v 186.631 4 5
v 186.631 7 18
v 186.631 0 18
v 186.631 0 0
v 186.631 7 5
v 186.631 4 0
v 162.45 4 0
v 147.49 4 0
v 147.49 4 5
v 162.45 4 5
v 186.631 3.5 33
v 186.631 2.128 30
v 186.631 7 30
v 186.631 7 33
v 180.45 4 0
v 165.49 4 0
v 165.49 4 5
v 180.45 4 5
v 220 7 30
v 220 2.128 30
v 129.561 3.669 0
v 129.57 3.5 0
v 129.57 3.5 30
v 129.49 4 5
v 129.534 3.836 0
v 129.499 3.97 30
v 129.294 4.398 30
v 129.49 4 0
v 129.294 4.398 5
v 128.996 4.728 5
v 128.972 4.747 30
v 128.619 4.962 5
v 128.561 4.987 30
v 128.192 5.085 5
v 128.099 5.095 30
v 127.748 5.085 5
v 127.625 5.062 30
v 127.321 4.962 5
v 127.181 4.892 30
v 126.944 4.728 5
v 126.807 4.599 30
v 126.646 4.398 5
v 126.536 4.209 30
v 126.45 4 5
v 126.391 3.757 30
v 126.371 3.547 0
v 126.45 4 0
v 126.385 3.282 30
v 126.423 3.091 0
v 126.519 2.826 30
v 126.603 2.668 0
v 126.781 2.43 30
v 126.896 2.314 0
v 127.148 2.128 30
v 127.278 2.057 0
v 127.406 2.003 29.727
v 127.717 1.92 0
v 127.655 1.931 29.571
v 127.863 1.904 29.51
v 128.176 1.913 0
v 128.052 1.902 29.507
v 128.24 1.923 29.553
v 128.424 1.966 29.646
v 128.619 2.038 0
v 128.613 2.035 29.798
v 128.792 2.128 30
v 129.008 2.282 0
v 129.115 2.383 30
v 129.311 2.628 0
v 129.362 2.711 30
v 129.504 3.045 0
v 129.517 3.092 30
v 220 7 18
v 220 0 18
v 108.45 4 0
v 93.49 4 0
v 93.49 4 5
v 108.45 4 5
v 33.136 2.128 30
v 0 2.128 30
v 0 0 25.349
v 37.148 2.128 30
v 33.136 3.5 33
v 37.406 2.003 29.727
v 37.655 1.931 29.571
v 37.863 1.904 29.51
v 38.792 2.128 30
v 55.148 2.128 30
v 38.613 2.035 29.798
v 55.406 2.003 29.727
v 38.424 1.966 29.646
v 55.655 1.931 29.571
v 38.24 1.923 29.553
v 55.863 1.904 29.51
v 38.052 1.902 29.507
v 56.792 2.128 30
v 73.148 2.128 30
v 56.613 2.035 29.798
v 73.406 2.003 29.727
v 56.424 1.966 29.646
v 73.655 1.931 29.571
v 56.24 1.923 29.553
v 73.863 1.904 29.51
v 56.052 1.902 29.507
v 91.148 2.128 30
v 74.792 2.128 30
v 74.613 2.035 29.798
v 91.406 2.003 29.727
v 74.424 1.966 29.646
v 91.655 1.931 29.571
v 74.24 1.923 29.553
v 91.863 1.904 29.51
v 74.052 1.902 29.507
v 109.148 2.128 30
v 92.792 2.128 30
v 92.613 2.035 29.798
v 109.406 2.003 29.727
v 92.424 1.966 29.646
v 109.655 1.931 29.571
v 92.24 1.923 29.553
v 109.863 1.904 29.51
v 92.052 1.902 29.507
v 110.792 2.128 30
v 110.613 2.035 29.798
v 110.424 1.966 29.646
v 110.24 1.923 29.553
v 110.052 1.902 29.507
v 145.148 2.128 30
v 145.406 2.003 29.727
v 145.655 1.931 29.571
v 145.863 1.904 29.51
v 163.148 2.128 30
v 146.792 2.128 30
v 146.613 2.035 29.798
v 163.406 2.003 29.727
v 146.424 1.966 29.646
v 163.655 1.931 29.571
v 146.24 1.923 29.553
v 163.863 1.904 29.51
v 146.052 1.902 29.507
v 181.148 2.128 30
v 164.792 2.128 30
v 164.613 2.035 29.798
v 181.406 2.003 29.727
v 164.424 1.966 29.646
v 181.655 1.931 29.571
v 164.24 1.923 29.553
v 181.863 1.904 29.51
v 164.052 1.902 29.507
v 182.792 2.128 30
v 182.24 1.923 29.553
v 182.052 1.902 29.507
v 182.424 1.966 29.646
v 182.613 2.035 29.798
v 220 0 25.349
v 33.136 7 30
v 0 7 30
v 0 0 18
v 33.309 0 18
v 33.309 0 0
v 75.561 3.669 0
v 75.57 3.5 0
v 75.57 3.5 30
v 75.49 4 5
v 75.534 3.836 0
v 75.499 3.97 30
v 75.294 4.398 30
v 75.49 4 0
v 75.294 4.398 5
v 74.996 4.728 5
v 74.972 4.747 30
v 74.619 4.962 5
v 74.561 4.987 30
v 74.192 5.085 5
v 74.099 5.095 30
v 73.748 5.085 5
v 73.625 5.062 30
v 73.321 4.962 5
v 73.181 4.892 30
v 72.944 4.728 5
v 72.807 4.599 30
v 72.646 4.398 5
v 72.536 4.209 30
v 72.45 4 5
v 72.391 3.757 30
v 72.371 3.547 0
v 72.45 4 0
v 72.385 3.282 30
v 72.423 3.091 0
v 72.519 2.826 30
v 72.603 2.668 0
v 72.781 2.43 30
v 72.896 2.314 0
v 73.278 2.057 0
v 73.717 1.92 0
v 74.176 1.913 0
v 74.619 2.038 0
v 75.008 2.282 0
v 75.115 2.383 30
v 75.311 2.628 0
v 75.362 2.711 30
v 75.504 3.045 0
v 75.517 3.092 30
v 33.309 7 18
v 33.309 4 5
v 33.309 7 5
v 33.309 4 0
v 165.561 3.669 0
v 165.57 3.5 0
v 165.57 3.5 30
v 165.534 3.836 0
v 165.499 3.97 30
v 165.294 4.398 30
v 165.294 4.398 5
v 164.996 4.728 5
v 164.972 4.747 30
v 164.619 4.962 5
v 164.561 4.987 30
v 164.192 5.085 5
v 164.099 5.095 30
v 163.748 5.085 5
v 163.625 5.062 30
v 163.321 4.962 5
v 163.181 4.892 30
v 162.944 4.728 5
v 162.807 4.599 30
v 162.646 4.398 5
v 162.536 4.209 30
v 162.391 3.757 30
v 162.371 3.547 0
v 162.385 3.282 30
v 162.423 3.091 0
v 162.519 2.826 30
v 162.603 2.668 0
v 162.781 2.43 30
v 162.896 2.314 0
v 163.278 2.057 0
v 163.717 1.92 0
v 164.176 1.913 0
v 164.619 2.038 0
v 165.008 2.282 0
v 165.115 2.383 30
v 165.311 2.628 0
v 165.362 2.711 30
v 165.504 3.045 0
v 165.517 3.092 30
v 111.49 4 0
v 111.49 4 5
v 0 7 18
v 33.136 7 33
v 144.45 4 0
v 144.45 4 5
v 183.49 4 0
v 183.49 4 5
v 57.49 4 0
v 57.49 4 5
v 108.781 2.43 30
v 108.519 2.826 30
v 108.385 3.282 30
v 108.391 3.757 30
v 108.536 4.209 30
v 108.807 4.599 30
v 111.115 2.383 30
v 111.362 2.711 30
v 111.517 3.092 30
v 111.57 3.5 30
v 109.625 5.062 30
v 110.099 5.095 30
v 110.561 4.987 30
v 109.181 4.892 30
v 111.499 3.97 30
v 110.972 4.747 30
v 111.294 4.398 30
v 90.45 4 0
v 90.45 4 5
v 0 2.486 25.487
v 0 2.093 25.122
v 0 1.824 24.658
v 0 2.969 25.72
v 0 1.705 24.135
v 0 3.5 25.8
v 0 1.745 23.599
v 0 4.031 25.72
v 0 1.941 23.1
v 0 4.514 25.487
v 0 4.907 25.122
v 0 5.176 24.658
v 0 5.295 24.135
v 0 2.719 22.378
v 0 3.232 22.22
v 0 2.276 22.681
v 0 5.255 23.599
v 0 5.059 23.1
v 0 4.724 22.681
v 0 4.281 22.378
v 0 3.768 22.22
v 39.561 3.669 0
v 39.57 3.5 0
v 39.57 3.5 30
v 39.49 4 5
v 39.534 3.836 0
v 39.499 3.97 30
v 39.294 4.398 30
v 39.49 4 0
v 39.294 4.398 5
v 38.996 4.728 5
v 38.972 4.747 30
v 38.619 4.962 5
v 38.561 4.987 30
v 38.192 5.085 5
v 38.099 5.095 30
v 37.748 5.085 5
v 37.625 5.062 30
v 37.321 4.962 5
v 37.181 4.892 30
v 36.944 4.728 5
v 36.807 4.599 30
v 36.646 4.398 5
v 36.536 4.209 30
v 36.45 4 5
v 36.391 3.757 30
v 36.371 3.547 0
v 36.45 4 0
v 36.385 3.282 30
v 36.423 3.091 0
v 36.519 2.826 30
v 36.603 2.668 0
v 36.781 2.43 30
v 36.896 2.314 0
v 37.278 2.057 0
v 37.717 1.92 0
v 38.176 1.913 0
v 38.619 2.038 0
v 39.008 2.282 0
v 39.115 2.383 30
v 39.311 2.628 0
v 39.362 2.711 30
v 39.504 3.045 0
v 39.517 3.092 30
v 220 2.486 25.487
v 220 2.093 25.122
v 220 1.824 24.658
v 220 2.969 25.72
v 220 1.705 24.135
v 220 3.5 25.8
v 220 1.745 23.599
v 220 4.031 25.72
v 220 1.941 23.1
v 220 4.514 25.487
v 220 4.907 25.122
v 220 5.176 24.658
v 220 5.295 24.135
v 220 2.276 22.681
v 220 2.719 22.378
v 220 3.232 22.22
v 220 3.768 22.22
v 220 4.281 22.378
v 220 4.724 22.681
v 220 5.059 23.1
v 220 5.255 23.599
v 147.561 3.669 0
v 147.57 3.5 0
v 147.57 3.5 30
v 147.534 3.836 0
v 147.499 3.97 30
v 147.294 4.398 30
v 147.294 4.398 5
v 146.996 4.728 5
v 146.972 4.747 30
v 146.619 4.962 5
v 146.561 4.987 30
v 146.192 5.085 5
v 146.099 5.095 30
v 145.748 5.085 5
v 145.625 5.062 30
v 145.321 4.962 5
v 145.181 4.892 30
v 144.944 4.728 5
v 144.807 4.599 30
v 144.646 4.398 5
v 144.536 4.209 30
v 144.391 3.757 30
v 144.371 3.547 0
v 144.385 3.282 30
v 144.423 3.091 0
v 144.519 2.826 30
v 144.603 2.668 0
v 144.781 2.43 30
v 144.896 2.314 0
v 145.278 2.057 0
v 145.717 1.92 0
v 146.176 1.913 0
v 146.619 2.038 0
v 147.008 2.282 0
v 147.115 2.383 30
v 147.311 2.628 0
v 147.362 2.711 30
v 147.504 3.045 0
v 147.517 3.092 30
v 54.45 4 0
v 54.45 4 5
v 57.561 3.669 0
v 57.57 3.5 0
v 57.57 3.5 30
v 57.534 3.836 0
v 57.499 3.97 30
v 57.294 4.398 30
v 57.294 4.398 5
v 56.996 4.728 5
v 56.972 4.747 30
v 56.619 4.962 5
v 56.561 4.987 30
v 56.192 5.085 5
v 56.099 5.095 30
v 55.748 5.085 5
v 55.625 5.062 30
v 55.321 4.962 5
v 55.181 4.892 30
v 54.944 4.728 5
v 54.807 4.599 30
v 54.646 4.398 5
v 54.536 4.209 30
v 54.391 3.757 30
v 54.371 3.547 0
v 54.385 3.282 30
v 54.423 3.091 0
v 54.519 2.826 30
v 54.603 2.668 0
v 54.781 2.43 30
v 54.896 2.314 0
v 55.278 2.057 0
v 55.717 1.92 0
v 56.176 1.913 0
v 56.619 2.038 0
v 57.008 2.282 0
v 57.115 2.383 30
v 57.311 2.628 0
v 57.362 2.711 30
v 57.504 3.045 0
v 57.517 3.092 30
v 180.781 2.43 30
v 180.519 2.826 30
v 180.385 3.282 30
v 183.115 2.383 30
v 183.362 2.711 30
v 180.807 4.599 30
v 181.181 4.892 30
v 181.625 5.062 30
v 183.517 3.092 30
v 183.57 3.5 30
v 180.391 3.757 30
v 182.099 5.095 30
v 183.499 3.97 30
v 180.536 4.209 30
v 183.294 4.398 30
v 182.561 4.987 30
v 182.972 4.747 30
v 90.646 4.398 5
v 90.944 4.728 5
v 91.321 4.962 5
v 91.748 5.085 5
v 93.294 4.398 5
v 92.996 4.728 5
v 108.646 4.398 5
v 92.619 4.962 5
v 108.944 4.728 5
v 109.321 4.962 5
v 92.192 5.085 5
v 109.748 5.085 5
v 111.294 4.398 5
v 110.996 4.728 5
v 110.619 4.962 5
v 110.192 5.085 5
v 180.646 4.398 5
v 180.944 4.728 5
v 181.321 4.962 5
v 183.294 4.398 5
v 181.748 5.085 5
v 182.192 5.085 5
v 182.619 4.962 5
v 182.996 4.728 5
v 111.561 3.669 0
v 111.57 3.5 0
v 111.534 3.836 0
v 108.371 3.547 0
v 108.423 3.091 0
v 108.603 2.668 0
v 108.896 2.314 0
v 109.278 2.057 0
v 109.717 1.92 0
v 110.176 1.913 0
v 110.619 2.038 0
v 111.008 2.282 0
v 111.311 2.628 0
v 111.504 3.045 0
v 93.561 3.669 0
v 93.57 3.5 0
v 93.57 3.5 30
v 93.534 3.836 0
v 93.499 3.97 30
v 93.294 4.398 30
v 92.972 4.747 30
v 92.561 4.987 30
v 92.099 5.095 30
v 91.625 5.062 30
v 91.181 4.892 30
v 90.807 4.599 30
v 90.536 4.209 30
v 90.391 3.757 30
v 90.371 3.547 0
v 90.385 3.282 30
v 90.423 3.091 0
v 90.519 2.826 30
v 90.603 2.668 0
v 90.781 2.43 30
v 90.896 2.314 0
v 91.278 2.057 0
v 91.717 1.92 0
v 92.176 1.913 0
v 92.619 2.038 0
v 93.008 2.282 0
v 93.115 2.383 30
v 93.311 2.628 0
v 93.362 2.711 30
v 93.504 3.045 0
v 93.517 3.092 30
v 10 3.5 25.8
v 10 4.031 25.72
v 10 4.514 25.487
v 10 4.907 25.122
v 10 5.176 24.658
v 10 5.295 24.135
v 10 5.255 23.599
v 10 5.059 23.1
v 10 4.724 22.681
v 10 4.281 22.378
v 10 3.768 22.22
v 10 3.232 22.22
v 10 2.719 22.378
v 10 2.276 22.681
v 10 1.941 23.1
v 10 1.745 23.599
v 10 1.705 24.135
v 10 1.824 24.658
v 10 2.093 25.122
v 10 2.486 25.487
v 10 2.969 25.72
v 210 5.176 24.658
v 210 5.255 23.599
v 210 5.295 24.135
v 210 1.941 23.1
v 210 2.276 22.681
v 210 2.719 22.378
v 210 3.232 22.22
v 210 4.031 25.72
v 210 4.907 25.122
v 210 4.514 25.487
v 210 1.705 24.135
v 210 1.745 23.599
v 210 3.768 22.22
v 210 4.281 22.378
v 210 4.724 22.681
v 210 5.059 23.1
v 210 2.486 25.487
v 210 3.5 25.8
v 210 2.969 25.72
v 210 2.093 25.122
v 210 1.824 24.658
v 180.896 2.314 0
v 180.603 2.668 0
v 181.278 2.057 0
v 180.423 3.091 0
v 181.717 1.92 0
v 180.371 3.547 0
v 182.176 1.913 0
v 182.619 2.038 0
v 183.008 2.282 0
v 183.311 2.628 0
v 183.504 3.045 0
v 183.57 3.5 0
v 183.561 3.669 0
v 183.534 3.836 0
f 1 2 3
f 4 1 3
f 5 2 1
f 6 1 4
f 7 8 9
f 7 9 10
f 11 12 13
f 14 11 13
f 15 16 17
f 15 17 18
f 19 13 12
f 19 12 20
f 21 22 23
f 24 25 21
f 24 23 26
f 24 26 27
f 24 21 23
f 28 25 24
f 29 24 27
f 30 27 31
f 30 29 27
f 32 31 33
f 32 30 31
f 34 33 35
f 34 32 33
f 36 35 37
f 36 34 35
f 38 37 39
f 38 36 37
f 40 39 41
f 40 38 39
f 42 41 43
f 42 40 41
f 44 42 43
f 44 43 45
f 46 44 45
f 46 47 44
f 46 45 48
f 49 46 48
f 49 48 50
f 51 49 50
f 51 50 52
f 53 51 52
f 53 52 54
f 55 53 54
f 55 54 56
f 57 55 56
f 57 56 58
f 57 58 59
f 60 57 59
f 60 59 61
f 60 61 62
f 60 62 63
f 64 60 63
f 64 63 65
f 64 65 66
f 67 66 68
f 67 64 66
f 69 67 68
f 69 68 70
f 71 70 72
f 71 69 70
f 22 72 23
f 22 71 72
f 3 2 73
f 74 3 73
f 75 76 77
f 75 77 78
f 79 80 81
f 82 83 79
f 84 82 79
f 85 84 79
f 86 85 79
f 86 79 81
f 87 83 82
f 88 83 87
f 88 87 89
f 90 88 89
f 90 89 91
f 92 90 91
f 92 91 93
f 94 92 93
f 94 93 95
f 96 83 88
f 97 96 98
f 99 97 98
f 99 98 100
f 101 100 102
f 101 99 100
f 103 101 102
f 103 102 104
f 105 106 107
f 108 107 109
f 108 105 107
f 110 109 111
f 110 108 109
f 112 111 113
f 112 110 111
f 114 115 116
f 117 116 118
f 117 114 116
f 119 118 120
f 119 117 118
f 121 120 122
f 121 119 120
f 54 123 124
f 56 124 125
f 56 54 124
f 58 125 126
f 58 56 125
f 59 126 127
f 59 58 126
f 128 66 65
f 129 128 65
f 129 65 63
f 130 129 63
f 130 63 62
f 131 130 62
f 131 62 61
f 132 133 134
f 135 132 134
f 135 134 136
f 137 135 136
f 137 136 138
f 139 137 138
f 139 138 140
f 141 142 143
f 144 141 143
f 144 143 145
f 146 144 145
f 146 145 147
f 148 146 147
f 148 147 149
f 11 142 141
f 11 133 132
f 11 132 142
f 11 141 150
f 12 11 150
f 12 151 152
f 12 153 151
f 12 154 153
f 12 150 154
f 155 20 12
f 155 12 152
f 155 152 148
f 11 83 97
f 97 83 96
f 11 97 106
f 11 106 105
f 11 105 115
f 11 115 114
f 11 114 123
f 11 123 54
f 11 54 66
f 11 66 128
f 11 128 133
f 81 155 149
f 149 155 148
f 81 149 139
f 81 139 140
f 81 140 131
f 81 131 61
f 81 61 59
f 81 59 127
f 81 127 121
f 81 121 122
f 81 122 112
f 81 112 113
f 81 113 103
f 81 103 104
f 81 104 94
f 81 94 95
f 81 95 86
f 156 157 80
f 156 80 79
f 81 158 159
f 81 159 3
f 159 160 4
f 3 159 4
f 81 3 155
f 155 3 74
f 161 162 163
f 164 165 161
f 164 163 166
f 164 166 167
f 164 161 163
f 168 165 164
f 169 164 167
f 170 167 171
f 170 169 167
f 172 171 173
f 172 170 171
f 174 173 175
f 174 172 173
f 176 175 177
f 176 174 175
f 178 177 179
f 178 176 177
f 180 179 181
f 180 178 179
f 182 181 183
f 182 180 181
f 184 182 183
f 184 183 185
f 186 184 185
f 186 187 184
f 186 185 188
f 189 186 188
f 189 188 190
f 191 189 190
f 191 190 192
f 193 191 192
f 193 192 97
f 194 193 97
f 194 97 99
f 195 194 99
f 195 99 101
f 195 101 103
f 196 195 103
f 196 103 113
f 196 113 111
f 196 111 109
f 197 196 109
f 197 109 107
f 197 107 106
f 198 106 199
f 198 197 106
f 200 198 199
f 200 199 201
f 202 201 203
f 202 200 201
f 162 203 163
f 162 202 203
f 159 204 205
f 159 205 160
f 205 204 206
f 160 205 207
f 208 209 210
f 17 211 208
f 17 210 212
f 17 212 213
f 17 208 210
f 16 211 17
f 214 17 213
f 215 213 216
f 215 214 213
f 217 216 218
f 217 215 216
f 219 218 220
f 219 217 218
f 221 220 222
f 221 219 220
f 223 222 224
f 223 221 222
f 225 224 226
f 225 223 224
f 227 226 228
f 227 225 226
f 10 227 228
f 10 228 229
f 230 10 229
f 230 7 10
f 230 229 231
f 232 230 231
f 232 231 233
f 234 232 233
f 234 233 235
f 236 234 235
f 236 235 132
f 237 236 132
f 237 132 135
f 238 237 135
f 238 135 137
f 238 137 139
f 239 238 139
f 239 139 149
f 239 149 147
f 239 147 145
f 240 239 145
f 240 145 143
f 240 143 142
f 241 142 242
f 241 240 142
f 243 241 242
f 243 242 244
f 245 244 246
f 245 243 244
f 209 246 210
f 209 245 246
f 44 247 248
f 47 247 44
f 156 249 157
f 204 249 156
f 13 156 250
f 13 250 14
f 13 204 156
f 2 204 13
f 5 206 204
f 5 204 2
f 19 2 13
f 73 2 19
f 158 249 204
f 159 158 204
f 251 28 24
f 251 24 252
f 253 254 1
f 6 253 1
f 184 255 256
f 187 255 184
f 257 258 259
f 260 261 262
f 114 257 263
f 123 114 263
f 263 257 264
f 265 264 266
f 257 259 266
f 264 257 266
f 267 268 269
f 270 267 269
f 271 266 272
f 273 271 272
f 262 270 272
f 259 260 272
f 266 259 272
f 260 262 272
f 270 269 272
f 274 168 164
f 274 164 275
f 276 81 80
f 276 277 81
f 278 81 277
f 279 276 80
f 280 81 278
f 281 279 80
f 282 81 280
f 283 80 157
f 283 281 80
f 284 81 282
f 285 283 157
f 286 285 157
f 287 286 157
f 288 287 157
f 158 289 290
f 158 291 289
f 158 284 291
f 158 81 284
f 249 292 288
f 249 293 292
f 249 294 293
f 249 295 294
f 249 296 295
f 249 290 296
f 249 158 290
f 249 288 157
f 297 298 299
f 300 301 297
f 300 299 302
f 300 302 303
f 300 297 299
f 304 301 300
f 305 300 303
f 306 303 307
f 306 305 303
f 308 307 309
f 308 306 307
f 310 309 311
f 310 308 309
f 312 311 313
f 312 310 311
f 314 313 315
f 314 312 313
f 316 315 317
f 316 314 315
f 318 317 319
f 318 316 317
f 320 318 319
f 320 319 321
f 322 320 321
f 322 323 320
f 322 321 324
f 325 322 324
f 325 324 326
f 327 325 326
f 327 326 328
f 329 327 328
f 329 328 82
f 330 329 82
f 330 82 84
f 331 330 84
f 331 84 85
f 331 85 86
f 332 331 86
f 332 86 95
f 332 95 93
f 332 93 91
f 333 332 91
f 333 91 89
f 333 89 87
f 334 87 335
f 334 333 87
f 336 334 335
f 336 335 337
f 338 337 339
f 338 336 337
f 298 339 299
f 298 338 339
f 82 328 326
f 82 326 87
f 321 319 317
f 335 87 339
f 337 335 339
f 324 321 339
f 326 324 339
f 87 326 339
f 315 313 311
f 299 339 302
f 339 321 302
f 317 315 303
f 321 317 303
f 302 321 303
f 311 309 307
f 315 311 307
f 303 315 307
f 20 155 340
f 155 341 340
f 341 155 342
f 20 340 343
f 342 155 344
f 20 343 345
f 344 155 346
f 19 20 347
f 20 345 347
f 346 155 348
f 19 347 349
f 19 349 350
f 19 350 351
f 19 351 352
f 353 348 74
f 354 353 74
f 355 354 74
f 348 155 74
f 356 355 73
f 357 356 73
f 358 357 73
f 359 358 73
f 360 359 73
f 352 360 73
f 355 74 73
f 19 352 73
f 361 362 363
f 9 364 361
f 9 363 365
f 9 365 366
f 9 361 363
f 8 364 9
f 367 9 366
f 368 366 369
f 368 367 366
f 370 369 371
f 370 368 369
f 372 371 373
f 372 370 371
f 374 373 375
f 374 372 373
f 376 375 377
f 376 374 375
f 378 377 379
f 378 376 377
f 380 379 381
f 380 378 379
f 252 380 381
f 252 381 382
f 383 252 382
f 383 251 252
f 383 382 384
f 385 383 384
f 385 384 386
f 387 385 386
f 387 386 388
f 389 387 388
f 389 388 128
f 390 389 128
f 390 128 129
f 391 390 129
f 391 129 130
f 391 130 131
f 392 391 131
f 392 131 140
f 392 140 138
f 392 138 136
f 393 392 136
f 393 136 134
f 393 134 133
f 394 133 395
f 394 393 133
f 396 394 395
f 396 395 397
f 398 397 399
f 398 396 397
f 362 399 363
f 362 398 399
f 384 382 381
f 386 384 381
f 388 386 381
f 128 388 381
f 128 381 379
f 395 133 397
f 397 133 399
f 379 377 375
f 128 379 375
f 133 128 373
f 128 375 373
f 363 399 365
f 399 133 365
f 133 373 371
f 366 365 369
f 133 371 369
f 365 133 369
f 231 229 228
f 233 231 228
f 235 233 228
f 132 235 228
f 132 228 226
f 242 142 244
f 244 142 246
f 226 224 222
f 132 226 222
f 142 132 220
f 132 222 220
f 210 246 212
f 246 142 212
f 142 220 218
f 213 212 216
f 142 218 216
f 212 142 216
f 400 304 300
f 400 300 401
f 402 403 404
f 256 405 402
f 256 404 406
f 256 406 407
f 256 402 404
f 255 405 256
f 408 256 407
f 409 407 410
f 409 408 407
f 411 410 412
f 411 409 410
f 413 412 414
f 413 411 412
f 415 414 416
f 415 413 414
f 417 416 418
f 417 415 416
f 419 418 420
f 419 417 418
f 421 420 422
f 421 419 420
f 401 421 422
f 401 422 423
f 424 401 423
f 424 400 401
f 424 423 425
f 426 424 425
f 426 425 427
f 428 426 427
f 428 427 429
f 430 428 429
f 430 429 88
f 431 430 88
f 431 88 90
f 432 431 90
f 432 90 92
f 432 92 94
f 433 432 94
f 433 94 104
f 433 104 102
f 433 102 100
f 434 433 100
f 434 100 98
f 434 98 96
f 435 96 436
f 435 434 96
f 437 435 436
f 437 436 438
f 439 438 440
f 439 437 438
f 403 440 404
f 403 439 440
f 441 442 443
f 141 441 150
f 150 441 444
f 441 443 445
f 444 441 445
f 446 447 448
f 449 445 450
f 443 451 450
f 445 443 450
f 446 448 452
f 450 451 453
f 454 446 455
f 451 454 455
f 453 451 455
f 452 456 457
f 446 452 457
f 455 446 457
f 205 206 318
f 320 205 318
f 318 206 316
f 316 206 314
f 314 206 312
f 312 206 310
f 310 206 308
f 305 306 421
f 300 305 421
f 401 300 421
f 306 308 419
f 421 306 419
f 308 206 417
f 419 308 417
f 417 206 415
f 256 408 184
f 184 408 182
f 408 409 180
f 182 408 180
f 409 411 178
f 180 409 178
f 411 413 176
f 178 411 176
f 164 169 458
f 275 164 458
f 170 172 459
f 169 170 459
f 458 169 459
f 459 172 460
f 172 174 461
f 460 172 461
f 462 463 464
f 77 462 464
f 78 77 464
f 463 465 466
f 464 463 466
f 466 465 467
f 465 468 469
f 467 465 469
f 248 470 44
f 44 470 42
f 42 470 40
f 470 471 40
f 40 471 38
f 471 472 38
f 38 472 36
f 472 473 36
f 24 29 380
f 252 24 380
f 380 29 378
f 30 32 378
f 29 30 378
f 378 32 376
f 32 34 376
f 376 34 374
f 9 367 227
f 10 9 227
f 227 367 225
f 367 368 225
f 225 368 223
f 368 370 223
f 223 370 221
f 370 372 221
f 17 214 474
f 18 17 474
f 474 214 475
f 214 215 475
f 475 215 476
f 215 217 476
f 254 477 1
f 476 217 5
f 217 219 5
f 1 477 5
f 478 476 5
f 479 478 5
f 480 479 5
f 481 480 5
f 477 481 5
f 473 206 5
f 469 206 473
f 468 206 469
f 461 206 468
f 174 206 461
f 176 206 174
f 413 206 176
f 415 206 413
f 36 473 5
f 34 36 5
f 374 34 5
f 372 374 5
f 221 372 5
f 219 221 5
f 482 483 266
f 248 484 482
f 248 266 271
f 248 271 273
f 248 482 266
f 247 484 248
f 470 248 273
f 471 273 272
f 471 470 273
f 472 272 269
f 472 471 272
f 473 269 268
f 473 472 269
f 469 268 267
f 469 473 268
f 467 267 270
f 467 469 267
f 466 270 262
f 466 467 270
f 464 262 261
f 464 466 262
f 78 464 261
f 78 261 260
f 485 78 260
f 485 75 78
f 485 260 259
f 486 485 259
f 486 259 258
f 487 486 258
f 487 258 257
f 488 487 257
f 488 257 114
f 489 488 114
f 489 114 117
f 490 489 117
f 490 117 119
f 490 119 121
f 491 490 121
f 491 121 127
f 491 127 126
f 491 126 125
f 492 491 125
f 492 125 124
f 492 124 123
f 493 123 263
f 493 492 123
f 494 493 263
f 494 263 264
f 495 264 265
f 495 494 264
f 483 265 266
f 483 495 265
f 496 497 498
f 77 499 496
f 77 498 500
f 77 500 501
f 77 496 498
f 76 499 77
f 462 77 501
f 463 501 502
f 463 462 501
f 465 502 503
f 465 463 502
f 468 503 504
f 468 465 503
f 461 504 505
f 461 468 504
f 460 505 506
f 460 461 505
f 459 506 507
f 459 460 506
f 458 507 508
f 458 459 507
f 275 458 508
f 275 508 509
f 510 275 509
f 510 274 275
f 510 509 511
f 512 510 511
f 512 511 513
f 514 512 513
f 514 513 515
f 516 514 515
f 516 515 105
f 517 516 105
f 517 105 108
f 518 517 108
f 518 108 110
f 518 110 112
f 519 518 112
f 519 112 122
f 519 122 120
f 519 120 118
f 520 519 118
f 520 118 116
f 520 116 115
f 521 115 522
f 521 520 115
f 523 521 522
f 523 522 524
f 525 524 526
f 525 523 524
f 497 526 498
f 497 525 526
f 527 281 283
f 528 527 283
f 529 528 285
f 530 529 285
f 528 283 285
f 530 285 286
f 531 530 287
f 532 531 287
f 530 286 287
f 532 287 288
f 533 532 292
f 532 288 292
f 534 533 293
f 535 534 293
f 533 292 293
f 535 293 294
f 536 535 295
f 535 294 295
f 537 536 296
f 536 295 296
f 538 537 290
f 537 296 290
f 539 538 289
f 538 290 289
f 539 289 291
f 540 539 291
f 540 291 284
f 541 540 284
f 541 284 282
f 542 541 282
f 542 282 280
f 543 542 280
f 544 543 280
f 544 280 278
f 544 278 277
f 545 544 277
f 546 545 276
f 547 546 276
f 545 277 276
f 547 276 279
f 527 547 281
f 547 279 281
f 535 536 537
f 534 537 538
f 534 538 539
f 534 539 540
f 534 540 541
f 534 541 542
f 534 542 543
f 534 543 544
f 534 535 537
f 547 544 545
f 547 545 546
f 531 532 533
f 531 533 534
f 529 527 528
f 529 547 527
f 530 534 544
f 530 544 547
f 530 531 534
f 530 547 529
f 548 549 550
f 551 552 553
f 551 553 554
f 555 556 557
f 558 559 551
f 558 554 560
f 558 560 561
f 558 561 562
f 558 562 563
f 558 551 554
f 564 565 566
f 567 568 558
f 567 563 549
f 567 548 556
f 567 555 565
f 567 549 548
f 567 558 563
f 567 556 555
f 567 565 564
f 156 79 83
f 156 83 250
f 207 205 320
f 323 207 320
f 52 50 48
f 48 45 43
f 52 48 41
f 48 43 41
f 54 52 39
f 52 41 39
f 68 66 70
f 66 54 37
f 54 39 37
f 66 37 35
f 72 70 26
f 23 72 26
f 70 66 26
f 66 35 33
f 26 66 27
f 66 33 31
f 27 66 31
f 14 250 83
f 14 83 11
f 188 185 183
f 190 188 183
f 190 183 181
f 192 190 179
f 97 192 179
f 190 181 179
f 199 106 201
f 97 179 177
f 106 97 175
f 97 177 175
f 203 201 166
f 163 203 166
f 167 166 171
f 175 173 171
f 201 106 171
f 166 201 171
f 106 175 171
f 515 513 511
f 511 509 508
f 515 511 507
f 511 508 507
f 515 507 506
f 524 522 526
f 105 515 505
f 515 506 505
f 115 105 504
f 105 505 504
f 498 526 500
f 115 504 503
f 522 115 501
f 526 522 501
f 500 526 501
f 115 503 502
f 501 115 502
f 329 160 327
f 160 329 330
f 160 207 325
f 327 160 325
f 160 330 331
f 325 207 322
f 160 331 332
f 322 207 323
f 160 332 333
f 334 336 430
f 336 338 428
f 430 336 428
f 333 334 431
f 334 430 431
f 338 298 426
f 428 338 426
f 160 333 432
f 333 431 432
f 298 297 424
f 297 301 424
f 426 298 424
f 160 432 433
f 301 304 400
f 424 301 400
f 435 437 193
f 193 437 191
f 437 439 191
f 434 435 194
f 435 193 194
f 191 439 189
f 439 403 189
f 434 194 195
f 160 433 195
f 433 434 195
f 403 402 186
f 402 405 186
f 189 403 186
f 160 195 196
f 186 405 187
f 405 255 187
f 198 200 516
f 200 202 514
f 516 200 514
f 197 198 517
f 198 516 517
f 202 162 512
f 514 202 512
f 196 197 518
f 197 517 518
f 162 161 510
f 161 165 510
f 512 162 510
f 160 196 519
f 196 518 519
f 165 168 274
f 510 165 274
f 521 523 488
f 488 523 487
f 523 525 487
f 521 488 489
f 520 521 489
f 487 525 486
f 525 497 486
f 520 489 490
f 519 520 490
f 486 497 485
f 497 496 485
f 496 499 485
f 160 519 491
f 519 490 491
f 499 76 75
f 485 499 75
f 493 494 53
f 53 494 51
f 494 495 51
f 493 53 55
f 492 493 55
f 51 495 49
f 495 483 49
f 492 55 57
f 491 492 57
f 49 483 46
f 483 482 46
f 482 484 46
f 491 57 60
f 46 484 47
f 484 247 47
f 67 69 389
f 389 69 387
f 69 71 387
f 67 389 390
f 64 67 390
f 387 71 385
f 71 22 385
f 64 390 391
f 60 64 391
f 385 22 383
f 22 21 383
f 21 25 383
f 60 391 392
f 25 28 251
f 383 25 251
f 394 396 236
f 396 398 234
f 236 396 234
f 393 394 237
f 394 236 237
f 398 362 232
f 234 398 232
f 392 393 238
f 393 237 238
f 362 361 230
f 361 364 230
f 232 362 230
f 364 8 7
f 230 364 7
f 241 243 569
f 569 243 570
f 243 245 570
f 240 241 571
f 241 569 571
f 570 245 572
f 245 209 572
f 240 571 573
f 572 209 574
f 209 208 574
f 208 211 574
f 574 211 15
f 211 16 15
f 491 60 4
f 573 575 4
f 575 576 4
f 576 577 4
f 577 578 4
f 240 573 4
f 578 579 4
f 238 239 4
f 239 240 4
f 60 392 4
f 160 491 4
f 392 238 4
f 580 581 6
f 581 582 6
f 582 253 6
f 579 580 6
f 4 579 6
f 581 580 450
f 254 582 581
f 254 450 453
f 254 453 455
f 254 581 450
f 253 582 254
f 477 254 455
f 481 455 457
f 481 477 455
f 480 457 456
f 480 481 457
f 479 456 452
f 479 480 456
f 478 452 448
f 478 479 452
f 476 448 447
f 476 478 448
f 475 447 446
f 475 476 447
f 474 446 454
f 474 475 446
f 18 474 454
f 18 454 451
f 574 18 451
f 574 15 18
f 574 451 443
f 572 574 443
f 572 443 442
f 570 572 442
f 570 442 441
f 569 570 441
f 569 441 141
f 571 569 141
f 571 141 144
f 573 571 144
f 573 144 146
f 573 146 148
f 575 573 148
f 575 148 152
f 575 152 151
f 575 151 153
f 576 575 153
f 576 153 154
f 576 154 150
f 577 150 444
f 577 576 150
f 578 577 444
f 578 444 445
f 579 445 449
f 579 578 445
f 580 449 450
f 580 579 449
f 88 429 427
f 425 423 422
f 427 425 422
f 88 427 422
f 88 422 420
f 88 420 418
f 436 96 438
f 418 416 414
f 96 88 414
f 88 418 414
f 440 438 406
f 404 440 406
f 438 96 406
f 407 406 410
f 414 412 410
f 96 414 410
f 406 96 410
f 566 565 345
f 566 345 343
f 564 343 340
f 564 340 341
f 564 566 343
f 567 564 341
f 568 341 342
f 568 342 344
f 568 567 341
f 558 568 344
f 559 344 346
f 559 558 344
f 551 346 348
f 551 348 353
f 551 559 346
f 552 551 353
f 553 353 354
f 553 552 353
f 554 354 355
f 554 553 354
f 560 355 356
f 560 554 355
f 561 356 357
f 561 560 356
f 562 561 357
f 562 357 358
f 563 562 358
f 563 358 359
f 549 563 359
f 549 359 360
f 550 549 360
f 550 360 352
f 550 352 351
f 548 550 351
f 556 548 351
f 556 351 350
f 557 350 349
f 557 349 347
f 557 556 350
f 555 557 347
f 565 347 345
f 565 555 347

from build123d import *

# Parameters (mm, degrees)
SKETCH_1_W          = 220
SKETCH_1_H          = 7
SKETCH_1_R          = 1.6
EXTRUDE_1_DEPTH     = 30
SKETCH_2_W          = 220
SKETCH_2_H          = 5
CUT_EXTRUDE_1_DEPTH = 3
SKETCH_3_W          = 33.308675227
SKETCH_3_H          = 18
SKETCH_3_W_2        = 33.368675227
CUT_EXTRUDE_2_DEPTH = 223.146348158
SKETCH_6_W          = 153.495185447
SKETCH_6_H          = 7
EXTRUDE_2_DEPTH     = 3
SKETCH_7_R          = 1.8
CUT_EXTRUDE_3_DEPTH = 10
CUT_EXTRUDE_START   = -10
SKETCH_8_R          = 1.8
CUT_EXTRUDE_4_DEPTH = 10
CUT_EXTRUDE_5_DEPTH = 223.571336879


with BuildPart() as part:
    # Эскиз1 → Бобышка-Вытянуть1 (new body)
    with BuildSketch(Plane.XY):
        with Locations((110, 3.5)):
            Rectangle(SKETCH_1_W, SKETCH_1_H)
        with Locations((37.97, 3.5)):
            Circle(SKETCH_1_R, mode=Mode.SUBTRACT)
        with Locations((55.97, 3.5)):
            Circle(SKETCH_1_R, mode=Mode.SUBTRACT)
        with Locations((73.97, 3.5)):
            Circle(SKETCH_1_R, mode=Mode.SUBTRACT)
        with Locations((91.97, 3.5)):
            Circle(SKETCH_1_R, mode=Mode.SUBTRACT)
        with Locations((109.97, 3.5)):
            Circle(SKETCH_1_R, mode=Mode.SUBTRACT)
        with Locations((127.97, 3.5)):
            Circle(SKETCH_1_R, mode=Mode.SUBTRACT)
        with Locations((145.97, 3.5)):
            Circle(SKETCH_1_R, mode=Mode.SUBTRACT)
        with Locations((163.97, 3.5)):
            Circle(SKETCH_1_R, mode=Mode.SUBTRACT)
        with Locations((181.97, 3.5)):
            Circle(SKETCH_1_R, mode=Mode.SUBTRACT)
    extrude(amount=EXTRUDE_1_DEPTH)

    # Эскиз2 → Вырез-Вытянуть1 (cut)
    with BuildSketch(Plane(origin=(0, 7, 0), x_dir=(1, 0, 0), z_dir=(0, 1, 0))):
        with Locations((110, -2.5)):
            Rectangle(SKETCH_2_W, SKETCH_2_H)
    extrude(amount=-CUT_EXTRUDE_1_DEPTH, mode=Mode.SUBTRACT)

    # Эскиз3 → Вырез-Вытянуть2 (cut, through all)
    with BuildSketch(Plane(origin=(0, 7, 0), x_dir=(1, 0, 0), z_dir=(0, 1, 0))):
        with Locations((16.654337614, -9)):
            Rectangle(SKETCH_3_W, SKETCH_3_H)
        with Locations((203.315662387, -9)):
            Rectangle(SKETCH_3_W_2, SKETCH_3_H)
    extrude(amount=-CUT_EXTRUDE_2_DEPTH, mode=Mode.SUBTRACT)

    # Эскиз6 → Бобышка-Вытянуть2 (add)
    with BuildSketch(Plane.XY.offset(30)):
        with Locations((109.88373205, 3.5)):
            Rectangle(SKETCH_6_W, SKETCH_6_H)
    extrude(amount=EXTRUDE_2_DEPTH)

    # Эскиз7 → Вырез-Вытянуть3 (cut)
    with BuildSketch(Plane.ZY):
        with Locations((24, 3.5)):
            Circle(SKETCH_7_R)
    extrude(amount=-CUT_EXTRUDE_3_DEPTH, mode=Mode.SUBTRACT)

    # Эскиз8 → Вырез-Вытянуть4 (cut)
    with BuildSketch(Plane(origin=(220, 0, 0), x_dir=(0, 0, -1), z_dir=(1, 0, 0)).offset(CUT_EXTRUDE_START)):
        with Locations(Location((-24, 3.5, 0), (0, 0, 180))):
            Circle(SKETCH_8_R)
    extrude(amount=CUT_EXTRUDE_4_DEPTH, mode=Mode.SUBTRACT)

    # Эскиз9 → Вырез-Вытянуть5 (cut, through all)
    with BuildSketch(Plane(origin=(220, 0, 0), x_dir=(0, 0, -1), z_dir=(1, 0, 0))):
        Polygon((-33, 0), (-33, 3.5), (-25.349385808, 0), align=None)
    extrude(amount=-CUT_EXTRUDE_5_DEPTH, mode=Mode.SUBTRACT)


solid = part.part
